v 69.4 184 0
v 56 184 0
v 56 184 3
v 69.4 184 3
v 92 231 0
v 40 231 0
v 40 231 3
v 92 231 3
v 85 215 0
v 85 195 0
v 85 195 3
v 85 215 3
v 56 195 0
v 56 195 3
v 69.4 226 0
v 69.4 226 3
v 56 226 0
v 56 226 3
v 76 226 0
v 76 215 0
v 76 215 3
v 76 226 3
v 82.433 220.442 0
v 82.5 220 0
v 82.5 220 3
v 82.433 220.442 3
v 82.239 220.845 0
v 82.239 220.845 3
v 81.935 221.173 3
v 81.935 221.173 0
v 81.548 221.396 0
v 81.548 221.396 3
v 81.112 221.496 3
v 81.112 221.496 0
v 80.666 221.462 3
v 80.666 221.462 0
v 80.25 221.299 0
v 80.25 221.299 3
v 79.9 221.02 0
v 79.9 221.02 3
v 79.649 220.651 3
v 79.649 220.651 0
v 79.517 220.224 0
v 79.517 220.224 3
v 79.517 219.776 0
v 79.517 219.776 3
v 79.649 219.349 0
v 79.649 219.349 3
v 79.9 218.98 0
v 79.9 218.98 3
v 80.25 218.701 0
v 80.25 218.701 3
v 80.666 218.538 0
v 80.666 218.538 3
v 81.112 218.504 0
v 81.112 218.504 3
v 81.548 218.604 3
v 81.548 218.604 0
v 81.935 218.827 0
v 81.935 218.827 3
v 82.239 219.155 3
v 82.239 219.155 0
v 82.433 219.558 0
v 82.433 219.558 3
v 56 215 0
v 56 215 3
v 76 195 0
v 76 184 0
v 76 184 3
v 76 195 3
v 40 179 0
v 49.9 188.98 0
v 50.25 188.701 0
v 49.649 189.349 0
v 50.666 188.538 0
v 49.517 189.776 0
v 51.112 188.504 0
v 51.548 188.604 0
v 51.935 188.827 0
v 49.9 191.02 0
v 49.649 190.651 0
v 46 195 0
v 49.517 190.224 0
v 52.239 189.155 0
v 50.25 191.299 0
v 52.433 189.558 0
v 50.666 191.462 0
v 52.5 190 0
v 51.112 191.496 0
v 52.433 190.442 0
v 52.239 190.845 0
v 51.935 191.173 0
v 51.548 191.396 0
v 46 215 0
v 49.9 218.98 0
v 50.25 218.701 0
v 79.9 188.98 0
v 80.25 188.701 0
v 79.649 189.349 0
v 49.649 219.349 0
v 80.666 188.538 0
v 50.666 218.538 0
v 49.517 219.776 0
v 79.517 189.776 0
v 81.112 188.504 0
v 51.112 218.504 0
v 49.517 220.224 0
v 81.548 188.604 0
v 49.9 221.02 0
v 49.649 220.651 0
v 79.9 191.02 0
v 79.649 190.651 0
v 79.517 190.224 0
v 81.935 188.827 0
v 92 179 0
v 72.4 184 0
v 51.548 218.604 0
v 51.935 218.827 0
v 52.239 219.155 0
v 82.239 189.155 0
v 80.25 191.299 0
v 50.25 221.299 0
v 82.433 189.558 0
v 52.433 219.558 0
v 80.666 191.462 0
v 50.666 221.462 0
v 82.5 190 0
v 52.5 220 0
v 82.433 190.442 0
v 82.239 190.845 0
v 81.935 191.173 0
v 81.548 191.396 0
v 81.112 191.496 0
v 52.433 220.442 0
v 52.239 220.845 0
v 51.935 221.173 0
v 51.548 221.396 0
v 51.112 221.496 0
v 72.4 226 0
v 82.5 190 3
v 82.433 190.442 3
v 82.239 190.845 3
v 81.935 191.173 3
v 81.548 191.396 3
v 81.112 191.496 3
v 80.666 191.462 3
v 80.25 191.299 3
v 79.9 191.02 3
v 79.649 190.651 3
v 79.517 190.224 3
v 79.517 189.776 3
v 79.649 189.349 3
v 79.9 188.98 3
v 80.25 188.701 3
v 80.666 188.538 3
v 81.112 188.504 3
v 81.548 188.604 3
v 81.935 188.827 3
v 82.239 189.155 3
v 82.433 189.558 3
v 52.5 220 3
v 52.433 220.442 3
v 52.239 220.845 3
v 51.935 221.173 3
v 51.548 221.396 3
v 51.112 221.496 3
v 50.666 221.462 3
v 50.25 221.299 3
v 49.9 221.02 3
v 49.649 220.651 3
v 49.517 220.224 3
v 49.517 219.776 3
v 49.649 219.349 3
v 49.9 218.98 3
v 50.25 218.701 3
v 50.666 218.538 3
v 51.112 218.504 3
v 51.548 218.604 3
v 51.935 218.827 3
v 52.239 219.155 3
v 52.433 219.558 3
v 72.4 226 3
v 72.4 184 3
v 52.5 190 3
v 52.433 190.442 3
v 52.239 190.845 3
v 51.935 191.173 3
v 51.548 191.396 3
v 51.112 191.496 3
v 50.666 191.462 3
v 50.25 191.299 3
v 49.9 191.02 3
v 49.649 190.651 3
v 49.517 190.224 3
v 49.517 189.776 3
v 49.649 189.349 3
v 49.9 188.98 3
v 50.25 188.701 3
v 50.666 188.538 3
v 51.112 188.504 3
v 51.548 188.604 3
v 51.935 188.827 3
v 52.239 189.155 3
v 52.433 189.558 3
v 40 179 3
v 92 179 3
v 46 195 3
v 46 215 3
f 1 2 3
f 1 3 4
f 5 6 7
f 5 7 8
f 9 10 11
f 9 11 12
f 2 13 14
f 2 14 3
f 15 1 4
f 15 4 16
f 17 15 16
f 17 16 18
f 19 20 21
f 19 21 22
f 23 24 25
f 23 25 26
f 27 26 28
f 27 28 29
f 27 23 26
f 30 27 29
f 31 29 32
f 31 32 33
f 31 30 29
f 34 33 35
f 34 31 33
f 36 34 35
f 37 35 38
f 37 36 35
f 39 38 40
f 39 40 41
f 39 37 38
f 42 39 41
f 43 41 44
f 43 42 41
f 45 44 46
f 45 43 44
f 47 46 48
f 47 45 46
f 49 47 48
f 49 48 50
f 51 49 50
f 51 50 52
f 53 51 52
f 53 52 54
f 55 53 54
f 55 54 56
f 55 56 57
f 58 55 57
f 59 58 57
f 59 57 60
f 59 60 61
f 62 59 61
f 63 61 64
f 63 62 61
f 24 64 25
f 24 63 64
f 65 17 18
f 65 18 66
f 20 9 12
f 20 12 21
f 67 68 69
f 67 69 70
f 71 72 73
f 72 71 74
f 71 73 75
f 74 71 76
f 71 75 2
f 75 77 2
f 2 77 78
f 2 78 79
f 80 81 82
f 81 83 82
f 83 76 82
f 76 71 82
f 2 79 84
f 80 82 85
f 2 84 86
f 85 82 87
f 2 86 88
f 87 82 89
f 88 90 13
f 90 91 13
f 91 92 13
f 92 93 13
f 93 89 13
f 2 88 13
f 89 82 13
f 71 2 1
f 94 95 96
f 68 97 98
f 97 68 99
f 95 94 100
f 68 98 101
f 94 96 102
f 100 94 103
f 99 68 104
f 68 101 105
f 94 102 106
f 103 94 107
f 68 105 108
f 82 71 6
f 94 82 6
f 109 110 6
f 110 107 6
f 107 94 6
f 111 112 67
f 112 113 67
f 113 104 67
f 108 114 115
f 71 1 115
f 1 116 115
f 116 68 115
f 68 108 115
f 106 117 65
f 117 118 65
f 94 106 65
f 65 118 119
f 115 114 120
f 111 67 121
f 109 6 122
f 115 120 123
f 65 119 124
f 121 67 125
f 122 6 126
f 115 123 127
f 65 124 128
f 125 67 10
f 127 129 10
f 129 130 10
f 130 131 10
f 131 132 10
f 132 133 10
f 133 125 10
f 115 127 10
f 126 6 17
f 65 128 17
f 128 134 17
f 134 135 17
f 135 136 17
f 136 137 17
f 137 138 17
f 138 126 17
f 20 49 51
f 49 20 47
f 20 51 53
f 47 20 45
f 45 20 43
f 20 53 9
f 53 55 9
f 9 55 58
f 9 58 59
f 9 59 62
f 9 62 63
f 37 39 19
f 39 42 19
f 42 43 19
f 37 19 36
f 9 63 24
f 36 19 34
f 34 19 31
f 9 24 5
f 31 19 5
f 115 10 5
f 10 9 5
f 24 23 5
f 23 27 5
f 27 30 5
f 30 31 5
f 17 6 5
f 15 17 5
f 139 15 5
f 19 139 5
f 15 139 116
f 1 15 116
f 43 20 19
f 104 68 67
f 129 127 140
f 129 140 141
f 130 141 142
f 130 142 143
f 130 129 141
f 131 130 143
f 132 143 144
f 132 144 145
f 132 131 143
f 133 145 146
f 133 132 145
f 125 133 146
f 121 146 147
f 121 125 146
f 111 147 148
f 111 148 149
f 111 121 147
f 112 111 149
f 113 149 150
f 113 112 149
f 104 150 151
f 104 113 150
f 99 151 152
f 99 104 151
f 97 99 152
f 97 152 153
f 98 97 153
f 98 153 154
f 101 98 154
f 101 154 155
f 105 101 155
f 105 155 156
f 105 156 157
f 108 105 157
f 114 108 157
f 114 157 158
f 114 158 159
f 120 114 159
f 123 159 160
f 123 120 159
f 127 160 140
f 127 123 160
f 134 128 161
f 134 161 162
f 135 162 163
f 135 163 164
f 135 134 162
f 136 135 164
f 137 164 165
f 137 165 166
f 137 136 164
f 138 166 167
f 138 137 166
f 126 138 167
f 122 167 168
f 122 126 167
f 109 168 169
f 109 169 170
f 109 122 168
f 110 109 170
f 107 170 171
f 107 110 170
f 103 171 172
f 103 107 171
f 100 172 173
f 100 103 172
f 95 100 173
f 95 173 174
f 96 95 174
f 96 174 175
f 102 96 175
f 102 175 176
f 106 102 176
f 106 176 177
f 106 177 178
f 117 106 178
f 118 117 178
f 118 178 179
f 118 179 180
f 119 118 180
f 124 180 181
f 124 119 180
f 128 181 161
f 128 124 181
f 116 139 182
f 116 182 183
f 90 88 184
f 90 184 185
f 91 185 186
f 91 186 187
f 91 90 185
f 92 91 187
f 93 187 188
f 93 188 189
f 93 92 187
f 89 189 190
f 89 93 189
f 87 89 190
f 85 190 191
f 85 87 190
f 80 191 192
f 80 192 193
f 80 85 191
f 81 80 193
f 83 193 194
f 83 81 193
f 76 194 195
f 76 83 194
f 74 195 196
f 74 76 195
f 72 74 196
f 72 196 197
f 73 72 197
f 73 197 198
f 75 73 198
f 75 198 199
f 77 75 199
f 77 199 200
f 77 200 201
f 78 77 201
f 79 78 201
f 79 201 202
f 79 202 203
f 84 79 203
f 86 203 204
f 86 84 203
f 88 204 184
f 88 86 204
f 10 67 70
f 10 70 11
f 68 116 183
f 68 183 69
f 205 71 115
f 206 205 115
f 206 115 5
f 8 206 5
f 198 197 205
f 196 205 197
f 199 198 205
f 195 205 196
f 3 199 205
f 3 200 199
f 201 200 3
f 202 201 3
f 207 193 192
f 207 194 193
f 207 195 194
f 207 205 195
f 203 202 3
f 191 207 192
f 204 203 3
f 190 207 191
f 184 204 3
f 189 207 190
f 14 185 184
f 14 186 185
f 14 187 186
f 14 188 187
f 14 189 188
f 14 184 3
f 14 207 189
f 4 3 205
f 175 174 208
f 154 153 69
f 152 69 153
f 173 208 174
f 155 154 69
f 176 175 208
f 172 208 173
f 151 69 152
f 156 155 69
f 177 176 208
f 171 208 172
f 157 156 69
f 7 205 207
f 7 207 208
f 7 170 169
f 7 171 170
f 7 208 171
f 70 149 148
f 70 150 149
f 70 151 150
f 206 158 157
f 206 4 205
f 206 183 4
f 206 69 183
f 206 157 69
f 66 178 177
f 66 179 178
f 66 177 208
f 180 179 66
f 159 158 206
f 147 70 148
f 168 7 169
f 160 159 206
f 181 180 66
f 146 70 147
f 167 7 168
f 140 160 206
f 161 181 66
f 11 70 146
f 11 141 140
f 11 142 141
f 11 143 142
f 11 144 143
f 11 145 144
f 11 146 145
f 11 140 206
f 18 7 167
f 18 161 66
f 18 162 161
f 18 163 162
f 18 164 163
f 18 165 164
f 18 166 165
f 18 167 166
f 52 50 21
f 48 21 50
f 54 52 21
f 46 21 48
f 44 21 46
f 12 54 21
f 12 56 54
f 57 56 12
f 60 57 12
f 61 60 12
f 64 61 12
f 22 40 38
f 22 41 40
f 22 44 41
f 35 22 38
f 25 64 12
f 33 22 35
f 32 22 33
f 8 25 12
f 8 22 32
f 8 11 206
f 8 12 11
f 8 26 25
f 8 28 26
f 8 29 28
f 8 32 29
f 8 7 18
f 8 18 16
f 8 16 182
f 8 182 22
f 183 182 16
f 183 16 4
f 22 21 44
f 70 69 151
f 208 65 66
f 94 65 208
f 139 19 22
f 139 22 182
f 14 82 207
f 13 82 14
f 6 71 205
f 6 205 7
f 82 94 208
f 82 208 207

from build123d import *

# Parameters (mm, degrees)
MODEL_W                 = 52
MODEL_H                 = 52
MODEL_R                 = 1.5
SALIENTE_EXTRUIR1_DEPTH = 3


with BuildPart() as part:
    # Model → Saliente-Extruir1 (new body)
    with BuildSketch(Plane.XY):
        with Locations((66, 205)):
            Rectangle(MODEL_W, MODEL_H)
        with Locations((51, 190)):
            Circle(MODEL_R, mode=Mode.SUBTRACT)
        with Locations((81, 190)):
            Circle(MODEL_R, mode=Mode.SUBTRACT)
        with Locations((81, 220)):
            Circle(MODEL_R, mode=Mode.SUBTRACT)
        with Locations((51, 220)):
            Circle(MODEL_R, mode=Mode.SUBTRACT)
        Polygon((56, 226), (56, 215), (46, 215), (46, 195), (56, 195), (56, 184), (69.4, 184), (69.4, 226), align=None, mode=Mode.SUBTRACT)
        Polygon((72.4, 226), (72.4, 184), (76, 184), (76, 195), (85, 195), (85, 215), (76, 215), (76, 226), align=None, mode=Mode.SUBTRACT)
    extrude(amount=SALIENTE_EXTRUIR1_DEPTH)


solid = part.part
